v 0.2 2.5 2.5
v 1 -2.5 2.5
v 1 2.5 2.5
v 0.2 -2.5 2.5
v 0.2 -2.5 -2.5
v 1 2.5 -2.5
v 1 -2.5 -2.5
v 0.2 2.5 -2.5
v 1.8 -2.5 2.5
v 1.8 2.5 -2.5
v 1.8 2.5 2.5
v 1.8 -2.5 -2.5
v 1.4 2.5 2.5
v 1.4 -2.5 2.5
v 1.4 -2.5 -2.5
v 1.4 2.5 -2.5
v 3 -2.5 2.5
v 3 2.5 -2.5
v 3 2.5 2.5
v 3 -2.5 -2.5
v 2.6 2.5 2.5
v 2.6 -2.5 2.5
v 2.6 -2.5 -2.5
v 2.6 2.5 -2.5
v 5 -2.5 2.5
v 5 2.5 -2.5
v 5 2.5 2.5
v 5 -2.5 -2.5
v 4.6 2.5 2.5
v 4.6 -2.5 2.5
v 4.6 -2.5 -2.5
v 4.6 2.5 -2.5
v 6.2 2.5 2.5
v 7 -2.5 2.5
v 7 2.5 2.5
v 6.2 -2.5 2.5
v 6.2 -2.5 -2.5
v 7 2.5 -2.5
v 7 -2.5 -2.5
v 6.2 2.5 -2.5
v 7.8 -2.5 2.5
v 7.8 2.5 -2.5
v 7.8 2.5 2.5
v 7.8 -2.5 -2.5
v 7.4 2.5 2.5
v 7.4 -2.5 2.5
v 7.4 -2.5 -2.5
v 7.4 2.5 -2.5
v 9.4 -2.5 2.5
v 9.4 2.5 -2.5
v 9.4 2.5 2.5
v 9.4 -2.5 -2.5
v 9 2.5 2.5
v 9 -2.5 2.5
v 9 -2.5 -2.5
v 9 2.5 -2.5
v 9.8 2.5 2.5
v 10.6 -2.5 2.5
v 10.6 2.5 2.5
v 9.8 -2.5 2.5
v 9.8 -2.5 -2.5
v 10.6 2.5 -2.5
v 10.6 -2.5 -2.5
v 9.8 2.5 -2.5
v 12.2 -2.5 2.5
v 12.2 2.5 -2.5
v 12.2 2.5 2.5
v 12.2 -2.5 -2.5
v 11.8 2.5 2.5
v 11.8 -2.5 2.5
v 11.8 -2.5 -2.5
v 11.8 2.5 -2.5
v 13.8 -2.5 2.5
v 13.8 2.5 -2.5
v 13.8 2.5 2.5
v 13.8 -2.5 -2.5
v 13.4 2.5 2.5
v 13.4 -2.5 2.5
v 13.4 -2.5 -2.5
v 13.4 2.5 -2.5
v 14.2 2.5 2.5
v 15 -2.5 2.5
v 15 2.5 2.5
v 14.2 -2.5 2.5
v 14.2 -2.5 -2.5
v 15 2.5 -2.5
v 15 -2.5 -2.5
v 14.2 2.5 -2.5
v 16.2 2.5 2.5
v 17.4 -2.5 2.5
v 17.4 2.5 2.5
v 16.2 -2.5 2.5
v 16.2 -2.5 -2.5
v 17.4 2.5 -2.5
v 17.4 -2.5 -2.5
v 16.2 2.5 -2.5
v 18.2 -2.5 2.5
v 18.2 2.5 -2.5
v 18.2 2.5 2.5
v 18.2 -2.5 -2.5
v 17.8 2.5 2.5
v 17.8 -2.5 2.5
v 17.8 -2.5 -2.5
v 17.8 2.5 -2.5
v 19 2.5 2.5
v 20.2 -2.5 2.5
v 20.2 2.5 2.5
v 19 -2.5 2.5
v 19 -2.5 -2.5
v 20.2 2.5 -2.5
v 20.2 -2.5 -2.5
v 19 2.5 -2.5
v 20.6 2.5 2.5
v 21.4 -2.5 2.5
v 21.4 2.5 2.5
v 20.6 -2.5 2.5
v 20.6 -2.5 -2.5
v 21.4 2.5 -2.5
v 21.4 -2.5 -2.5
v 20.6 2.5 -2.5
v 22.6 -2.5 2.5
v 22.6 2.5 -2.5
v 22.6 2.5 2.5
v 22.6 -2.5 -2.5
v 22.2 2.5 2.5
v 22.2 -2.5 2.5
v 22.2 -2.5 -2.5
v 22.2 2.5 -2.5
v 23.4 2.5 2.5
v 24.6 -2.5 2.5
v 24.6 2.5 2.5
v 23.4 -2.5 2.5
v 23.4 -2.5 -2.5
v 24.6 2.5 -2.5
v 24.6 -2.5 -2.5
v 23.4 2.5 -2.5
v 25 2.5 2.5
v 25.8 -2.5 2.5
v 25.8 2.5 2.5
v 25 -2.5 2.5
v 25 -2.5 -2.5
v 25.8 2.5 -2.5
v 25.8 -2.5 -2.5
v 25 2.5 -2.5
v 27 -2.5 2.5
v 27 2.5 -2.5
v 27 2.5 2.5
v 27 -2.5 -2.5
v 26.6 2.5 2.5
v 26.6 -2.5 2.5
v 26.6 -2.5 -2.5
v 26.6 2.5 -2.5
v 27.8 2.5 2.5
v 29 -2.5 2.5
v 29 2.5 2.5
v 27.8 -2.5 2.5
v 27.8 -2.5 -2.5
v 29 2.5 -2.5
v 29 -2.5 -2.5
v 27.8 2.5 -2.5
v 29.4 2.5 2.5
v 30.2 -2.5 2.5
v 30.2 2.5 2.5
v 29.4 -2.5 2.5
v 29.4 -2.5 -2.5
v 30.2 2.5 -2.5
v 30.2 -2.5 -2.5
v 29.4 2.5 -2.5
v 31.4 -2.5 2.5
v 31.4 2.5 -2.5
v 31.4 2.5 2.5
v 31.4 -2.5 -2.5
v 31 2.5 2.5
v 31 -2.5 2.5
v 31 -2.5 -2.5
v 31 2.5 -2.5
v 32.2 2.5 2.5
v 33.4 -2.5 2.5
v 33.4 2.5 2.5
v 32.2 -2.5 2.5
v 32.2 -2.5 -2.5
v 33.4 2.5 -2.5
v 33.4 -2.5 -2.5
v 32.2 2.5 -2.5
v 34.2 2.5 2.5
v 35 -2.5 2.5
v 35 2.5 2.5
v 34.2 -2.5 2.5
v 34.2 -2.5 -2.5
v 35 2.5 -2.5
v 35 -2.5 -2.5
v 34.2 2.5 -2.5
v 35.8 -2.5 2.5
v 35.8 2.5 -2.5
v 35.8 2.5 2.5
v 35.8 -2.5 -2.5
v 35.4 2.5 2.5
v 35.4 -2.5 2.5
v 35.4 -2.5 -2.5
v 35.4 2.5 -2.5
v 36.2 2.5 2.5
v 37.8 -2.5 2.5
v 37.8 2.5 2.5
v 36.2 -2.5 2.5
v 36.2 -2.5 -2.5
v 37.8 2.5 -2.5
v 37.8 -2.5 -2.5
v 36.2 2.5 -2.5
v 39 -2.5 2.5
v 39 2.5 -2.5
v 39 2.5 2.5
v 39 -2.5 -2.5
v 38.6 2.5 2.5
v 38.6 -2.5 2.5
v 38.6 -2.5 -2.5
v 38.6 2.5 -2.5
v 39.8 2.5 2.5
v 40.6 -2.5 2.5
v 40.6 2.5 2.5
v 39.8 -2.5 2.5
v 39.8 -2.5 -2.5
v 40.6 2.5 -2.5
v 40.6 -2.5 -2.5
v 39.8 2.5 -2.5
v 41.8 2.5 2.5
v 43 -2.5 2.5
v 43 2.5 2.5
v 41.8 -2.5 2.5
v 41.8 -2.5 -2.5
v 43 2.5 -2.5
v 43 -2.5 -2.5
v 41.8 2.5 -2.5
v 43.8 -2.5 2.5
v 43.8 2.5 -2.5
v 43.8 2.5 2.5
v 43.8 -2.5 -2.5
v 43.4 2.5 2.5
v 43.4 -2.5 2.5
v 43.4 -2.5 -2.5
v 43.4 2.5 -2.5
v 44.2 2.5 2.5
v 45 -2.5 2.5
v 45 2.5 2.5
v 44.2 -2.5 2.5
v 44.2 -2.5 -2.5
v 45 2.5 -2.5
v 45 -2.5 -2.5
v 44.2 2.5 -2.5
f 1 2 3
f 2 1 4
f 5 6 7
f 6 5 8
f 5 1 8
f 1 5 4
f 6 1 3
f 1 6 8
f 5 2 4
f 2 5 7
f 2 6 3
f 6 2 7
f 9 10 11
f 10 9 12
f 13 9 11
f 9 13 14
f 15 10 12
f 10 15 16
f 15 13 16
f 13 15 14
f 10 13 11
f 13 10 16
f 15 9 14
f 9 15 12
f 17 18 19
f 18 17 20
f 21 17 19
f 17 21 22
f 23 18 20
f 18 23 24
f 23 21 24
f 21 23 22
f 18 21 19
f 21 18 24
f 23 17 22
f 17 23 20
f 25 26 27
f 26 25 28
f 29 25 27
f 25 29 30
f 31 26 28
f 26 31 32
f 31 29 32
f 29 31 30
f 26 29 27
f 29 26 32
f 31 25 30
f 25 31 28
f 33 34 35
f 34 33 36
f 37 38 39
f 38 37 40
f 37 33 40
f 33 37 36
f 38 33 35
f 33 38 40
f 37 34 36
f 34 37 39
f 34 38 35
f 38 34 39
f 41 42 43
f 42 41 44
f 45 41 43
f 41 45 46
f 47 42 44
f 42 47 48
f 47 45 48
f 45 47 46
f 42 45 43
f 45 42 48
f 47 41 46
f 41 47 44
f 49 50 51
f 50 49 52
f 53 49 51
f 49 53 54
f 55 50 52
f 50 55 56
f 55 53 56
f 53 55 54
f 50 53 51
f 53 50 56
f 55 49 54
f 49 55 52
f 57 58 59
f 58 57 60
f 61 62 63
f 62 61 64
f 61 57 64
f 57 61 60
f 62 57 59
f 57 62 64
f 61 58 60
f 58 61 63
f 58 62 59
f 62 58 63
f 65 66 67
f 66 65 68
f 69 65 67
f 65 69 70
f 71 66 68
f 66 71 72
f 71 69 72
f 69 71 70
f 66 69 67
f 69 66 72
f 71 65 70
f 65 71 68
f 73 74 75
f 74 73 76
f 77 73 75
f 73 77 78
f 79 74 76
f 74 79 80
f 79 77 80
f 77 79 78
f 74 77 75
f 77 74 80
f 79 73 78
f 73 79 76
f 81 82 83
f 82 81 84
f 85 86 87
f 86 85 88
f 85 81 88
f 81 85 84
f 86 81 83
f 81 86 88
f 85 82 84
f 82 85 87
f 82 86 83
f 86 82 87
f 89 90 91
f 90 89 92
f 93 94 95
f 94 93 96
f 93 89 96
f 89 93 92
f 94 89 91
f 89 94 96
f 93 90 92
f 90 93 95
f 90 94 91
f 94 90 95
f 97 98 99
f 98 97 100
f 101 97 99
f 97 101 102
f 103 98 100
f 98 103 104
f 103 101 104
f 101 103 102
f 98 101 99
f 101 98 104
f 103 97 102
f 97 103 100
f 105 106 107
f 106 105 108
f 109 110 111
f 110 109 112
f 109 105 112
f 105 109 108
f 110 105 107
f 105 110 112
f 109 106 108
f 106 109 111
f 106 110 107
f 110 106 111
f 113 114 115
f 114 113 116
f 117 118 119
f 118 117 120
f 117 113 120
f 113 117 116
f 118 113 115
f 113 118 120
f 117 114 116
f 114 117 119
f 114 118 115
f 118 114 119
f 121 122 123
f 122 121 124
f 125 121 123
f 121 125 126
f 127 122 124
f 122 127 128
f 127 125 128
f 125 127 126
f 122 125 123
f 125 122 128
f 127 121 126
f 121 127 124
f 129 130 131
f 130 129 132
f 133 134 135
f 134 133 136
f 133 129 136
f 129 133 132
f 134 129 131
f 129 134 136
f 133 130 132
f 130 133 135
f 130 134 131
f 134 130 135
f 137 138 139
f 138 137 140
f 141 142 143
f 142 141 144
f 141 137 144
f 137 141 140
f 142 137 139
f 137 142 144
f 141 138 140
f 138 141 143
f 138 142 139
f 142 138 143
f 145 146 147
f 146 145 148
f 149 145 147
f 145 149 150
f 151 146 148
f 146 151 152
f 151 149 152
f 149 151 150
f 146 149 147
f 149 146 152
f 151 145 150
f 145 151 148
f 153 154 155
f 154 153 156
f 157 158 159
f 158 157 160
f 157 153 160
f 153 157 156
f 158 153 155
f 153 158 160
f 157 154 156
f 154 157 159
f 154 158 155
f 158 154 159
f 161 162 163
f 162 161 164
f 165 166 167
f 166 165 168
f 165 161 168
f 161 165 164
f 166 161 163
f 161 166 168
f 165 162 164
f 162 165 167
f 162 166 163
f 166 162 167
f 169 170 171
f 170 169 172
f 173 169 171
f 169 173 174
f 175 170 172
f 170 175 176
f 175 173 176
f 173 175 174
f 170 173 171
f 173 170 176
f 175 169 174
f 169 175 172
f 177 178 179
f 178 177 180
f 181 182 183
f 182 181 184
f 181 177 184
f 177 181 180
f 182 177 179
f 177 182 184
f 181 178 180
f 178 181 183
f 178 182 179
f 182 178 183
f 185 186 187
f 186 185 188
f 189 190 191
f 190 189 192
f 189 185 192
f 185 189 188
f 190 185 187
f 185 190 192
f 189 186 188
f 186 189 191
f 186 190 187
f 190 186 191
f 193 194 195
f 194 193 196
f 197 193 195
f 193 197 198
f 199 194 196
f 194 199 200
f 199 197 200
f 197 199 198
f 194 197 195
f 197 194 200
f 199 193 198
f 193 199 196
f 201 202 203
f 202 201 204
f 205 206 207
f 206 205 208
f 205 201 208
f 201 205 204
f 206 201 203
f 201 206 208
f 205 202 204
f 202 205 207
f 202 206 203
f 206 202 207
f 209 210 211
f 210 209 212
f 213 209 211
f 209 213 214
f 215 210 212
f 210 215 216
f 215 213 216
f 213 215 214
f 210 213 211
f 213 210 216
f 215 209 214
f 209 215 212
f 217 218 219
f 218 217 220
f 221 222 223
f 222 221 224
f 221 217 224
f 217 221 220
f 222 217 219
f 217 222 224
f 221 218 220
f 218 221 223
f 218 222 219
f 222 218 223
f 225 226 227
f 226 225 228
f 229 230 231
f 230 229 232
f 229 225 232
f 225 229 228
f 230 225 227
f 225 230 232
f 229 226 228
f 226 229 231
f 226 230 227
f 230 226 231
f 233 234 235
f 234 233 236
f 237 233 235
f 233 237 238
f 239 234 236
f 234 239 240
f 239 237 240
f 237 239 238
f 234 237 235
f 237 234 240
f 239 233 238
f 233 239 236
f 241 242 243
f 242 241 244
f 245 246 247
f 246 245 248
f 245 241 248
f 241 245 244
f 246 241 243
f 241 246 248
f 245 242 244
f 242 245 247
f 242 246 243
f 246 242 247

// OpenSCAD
translate([0.4,0,0])  cube(size = [0.4,5,5], center=true);
translate([0.8,0,0])  cube(size = [0.4,5,5], center=true);
translate([1.6,0,0])  cube(size = [0.4,5,5], center=true);
translate([2.8,0,0])  cube(size = [0.4,5,5], center=true);
translate([4.8,0,0])  cube(size = [0.4,5,5], center=true);
translate([6.4,0,0])  cube(size = [0.4,5,5], center=true);
translate([6.8,0,0])  cube(size = [0.4,5,5], center=true);
translate([7.6,0,0])  cube(size = [0.4,5,5], center=true);
translate([9.2,0,0])  cube(size = [0.4,5,5], center=true);
translate([10,0,0])  cube(size = [0.4,5,5], center=true);
translate([10.4,0,0])  cube(size = [0.4,5,5], center=true);
translate([12,0,0])  cube(size = [0.4,5,5], center=true);
translate([13.6,0,0])  cube(size = [0.4,5,5], center=true);
translate([14.4,0,0])  cube(size = [0.4,5,5], center=true);
translate([14.8,0,0])  cube(size = [0.4,5,5], center=true);
translate([16.4,0,0])  cube(size = [0.4,5,5], center=true);
translate([16.8,0,0])  cube(size = [0.4,5,5], center=true);
translate([17.2,0,0])  cube(size = [0.4,5,5], center=true);
translate([18,0,0])  cube(size = [0.4,5,5], center=true);
translate([19.2,0,0])  cube(size = [0.4,5,5], center=true);
translate([19.6,0,0])  cube(size = [0.4,5,5], center=true);
translate([20,0,0])  cube(size = [0.4,5,5], center=true);
translate([20.8,0,0])  cube(size = [0.4,5,5], center=true);
translate([21.2,0,0])  cube(size = [0.4,5,5], center=true);
translate([22.4,0,0])  cube(size = [0.4,5,5], center=true);
translate([23.6,0,0])  cube(size = [0.4,5,5], center=true);
translate([24,0,0])  cube(size = [0.4,5,5], center=true);
translate([24.4,0,0])  cube(size = [0.4,5,5], center=true);
translate([25.2,0,0])  cube(size = [0.4,5,5], center=true);
translate([25.6,0,0])  cube(size = [0.4,5,5], center=true);
translate([26.8,0,0])  cube(size = [0.4,5,5], center=true);
translate([28,0,0])  cube(size = [0.4,5,5], center=true);
translate([28.4,0,0])  cube(size = [0.4,5,5], center=true);
translate([28.8,0,0])  cube(size = [0.4,5,5], center=true);
translate([29.6,0,0])  cube(size = [0.4,5,5], center=true);
translate([30,0,0])  cube(size = [0.4,5,5], center=true);
translate([31.2,0,0])  cube(size = [0.4,5,5], center=true);
translate([32.4,0,0])  cube(size = [0.4,5,5], center=true);
translate([32.8,0,0])  cube(size = [0.4,5,5], center=true);
translate([33.2,0,0])  cube(size = [0.4,5,5], center=true);
translate([34.4,0,0])  cube(size = [0.4,5,5], center=true);
translate([34.8,0,0])  cube(size = [0.4,5,5], center=true);
translate([35.6,0,0])  cube(size = [0.4,5,5], center=true);
translate([36.4,0,0])  cube(size = [0.4,5,5], center=true);
translate([36.8,0,0])  cube(size = [0.4,5,5], center=true);
translate([37.2,0,0])  cube(size = [0.4,5,5], center=true);
translate([37.6,0,0])  cube(size = [0.4,5,5], center=true);
translate([38.8,0,0])  cube(size = [0.4,5,5], center=true);
translate([40,0,0])  cube(size = [0.4,5,5], center=true);
translate([40.4,0,0])  cube(size = [0.4,5,5], center=true);
translate([42,0,0])  cube(size = [0.4,5,5], center=true);
translate([42.4,0,0])  cube(size = [0.4,5,5], center=true);
translate([42.8,0,0])  cube(size = [0.4,5,5], center=true);
translate([43.6,0,0])  cube(size = [0.4,5,5], center=true);
translate([44.4,0,0])  cube(size = [0.4,5,5], center=true);
translate([44.8,0,0])  cube(size = [0.4,5,5], center=true);
